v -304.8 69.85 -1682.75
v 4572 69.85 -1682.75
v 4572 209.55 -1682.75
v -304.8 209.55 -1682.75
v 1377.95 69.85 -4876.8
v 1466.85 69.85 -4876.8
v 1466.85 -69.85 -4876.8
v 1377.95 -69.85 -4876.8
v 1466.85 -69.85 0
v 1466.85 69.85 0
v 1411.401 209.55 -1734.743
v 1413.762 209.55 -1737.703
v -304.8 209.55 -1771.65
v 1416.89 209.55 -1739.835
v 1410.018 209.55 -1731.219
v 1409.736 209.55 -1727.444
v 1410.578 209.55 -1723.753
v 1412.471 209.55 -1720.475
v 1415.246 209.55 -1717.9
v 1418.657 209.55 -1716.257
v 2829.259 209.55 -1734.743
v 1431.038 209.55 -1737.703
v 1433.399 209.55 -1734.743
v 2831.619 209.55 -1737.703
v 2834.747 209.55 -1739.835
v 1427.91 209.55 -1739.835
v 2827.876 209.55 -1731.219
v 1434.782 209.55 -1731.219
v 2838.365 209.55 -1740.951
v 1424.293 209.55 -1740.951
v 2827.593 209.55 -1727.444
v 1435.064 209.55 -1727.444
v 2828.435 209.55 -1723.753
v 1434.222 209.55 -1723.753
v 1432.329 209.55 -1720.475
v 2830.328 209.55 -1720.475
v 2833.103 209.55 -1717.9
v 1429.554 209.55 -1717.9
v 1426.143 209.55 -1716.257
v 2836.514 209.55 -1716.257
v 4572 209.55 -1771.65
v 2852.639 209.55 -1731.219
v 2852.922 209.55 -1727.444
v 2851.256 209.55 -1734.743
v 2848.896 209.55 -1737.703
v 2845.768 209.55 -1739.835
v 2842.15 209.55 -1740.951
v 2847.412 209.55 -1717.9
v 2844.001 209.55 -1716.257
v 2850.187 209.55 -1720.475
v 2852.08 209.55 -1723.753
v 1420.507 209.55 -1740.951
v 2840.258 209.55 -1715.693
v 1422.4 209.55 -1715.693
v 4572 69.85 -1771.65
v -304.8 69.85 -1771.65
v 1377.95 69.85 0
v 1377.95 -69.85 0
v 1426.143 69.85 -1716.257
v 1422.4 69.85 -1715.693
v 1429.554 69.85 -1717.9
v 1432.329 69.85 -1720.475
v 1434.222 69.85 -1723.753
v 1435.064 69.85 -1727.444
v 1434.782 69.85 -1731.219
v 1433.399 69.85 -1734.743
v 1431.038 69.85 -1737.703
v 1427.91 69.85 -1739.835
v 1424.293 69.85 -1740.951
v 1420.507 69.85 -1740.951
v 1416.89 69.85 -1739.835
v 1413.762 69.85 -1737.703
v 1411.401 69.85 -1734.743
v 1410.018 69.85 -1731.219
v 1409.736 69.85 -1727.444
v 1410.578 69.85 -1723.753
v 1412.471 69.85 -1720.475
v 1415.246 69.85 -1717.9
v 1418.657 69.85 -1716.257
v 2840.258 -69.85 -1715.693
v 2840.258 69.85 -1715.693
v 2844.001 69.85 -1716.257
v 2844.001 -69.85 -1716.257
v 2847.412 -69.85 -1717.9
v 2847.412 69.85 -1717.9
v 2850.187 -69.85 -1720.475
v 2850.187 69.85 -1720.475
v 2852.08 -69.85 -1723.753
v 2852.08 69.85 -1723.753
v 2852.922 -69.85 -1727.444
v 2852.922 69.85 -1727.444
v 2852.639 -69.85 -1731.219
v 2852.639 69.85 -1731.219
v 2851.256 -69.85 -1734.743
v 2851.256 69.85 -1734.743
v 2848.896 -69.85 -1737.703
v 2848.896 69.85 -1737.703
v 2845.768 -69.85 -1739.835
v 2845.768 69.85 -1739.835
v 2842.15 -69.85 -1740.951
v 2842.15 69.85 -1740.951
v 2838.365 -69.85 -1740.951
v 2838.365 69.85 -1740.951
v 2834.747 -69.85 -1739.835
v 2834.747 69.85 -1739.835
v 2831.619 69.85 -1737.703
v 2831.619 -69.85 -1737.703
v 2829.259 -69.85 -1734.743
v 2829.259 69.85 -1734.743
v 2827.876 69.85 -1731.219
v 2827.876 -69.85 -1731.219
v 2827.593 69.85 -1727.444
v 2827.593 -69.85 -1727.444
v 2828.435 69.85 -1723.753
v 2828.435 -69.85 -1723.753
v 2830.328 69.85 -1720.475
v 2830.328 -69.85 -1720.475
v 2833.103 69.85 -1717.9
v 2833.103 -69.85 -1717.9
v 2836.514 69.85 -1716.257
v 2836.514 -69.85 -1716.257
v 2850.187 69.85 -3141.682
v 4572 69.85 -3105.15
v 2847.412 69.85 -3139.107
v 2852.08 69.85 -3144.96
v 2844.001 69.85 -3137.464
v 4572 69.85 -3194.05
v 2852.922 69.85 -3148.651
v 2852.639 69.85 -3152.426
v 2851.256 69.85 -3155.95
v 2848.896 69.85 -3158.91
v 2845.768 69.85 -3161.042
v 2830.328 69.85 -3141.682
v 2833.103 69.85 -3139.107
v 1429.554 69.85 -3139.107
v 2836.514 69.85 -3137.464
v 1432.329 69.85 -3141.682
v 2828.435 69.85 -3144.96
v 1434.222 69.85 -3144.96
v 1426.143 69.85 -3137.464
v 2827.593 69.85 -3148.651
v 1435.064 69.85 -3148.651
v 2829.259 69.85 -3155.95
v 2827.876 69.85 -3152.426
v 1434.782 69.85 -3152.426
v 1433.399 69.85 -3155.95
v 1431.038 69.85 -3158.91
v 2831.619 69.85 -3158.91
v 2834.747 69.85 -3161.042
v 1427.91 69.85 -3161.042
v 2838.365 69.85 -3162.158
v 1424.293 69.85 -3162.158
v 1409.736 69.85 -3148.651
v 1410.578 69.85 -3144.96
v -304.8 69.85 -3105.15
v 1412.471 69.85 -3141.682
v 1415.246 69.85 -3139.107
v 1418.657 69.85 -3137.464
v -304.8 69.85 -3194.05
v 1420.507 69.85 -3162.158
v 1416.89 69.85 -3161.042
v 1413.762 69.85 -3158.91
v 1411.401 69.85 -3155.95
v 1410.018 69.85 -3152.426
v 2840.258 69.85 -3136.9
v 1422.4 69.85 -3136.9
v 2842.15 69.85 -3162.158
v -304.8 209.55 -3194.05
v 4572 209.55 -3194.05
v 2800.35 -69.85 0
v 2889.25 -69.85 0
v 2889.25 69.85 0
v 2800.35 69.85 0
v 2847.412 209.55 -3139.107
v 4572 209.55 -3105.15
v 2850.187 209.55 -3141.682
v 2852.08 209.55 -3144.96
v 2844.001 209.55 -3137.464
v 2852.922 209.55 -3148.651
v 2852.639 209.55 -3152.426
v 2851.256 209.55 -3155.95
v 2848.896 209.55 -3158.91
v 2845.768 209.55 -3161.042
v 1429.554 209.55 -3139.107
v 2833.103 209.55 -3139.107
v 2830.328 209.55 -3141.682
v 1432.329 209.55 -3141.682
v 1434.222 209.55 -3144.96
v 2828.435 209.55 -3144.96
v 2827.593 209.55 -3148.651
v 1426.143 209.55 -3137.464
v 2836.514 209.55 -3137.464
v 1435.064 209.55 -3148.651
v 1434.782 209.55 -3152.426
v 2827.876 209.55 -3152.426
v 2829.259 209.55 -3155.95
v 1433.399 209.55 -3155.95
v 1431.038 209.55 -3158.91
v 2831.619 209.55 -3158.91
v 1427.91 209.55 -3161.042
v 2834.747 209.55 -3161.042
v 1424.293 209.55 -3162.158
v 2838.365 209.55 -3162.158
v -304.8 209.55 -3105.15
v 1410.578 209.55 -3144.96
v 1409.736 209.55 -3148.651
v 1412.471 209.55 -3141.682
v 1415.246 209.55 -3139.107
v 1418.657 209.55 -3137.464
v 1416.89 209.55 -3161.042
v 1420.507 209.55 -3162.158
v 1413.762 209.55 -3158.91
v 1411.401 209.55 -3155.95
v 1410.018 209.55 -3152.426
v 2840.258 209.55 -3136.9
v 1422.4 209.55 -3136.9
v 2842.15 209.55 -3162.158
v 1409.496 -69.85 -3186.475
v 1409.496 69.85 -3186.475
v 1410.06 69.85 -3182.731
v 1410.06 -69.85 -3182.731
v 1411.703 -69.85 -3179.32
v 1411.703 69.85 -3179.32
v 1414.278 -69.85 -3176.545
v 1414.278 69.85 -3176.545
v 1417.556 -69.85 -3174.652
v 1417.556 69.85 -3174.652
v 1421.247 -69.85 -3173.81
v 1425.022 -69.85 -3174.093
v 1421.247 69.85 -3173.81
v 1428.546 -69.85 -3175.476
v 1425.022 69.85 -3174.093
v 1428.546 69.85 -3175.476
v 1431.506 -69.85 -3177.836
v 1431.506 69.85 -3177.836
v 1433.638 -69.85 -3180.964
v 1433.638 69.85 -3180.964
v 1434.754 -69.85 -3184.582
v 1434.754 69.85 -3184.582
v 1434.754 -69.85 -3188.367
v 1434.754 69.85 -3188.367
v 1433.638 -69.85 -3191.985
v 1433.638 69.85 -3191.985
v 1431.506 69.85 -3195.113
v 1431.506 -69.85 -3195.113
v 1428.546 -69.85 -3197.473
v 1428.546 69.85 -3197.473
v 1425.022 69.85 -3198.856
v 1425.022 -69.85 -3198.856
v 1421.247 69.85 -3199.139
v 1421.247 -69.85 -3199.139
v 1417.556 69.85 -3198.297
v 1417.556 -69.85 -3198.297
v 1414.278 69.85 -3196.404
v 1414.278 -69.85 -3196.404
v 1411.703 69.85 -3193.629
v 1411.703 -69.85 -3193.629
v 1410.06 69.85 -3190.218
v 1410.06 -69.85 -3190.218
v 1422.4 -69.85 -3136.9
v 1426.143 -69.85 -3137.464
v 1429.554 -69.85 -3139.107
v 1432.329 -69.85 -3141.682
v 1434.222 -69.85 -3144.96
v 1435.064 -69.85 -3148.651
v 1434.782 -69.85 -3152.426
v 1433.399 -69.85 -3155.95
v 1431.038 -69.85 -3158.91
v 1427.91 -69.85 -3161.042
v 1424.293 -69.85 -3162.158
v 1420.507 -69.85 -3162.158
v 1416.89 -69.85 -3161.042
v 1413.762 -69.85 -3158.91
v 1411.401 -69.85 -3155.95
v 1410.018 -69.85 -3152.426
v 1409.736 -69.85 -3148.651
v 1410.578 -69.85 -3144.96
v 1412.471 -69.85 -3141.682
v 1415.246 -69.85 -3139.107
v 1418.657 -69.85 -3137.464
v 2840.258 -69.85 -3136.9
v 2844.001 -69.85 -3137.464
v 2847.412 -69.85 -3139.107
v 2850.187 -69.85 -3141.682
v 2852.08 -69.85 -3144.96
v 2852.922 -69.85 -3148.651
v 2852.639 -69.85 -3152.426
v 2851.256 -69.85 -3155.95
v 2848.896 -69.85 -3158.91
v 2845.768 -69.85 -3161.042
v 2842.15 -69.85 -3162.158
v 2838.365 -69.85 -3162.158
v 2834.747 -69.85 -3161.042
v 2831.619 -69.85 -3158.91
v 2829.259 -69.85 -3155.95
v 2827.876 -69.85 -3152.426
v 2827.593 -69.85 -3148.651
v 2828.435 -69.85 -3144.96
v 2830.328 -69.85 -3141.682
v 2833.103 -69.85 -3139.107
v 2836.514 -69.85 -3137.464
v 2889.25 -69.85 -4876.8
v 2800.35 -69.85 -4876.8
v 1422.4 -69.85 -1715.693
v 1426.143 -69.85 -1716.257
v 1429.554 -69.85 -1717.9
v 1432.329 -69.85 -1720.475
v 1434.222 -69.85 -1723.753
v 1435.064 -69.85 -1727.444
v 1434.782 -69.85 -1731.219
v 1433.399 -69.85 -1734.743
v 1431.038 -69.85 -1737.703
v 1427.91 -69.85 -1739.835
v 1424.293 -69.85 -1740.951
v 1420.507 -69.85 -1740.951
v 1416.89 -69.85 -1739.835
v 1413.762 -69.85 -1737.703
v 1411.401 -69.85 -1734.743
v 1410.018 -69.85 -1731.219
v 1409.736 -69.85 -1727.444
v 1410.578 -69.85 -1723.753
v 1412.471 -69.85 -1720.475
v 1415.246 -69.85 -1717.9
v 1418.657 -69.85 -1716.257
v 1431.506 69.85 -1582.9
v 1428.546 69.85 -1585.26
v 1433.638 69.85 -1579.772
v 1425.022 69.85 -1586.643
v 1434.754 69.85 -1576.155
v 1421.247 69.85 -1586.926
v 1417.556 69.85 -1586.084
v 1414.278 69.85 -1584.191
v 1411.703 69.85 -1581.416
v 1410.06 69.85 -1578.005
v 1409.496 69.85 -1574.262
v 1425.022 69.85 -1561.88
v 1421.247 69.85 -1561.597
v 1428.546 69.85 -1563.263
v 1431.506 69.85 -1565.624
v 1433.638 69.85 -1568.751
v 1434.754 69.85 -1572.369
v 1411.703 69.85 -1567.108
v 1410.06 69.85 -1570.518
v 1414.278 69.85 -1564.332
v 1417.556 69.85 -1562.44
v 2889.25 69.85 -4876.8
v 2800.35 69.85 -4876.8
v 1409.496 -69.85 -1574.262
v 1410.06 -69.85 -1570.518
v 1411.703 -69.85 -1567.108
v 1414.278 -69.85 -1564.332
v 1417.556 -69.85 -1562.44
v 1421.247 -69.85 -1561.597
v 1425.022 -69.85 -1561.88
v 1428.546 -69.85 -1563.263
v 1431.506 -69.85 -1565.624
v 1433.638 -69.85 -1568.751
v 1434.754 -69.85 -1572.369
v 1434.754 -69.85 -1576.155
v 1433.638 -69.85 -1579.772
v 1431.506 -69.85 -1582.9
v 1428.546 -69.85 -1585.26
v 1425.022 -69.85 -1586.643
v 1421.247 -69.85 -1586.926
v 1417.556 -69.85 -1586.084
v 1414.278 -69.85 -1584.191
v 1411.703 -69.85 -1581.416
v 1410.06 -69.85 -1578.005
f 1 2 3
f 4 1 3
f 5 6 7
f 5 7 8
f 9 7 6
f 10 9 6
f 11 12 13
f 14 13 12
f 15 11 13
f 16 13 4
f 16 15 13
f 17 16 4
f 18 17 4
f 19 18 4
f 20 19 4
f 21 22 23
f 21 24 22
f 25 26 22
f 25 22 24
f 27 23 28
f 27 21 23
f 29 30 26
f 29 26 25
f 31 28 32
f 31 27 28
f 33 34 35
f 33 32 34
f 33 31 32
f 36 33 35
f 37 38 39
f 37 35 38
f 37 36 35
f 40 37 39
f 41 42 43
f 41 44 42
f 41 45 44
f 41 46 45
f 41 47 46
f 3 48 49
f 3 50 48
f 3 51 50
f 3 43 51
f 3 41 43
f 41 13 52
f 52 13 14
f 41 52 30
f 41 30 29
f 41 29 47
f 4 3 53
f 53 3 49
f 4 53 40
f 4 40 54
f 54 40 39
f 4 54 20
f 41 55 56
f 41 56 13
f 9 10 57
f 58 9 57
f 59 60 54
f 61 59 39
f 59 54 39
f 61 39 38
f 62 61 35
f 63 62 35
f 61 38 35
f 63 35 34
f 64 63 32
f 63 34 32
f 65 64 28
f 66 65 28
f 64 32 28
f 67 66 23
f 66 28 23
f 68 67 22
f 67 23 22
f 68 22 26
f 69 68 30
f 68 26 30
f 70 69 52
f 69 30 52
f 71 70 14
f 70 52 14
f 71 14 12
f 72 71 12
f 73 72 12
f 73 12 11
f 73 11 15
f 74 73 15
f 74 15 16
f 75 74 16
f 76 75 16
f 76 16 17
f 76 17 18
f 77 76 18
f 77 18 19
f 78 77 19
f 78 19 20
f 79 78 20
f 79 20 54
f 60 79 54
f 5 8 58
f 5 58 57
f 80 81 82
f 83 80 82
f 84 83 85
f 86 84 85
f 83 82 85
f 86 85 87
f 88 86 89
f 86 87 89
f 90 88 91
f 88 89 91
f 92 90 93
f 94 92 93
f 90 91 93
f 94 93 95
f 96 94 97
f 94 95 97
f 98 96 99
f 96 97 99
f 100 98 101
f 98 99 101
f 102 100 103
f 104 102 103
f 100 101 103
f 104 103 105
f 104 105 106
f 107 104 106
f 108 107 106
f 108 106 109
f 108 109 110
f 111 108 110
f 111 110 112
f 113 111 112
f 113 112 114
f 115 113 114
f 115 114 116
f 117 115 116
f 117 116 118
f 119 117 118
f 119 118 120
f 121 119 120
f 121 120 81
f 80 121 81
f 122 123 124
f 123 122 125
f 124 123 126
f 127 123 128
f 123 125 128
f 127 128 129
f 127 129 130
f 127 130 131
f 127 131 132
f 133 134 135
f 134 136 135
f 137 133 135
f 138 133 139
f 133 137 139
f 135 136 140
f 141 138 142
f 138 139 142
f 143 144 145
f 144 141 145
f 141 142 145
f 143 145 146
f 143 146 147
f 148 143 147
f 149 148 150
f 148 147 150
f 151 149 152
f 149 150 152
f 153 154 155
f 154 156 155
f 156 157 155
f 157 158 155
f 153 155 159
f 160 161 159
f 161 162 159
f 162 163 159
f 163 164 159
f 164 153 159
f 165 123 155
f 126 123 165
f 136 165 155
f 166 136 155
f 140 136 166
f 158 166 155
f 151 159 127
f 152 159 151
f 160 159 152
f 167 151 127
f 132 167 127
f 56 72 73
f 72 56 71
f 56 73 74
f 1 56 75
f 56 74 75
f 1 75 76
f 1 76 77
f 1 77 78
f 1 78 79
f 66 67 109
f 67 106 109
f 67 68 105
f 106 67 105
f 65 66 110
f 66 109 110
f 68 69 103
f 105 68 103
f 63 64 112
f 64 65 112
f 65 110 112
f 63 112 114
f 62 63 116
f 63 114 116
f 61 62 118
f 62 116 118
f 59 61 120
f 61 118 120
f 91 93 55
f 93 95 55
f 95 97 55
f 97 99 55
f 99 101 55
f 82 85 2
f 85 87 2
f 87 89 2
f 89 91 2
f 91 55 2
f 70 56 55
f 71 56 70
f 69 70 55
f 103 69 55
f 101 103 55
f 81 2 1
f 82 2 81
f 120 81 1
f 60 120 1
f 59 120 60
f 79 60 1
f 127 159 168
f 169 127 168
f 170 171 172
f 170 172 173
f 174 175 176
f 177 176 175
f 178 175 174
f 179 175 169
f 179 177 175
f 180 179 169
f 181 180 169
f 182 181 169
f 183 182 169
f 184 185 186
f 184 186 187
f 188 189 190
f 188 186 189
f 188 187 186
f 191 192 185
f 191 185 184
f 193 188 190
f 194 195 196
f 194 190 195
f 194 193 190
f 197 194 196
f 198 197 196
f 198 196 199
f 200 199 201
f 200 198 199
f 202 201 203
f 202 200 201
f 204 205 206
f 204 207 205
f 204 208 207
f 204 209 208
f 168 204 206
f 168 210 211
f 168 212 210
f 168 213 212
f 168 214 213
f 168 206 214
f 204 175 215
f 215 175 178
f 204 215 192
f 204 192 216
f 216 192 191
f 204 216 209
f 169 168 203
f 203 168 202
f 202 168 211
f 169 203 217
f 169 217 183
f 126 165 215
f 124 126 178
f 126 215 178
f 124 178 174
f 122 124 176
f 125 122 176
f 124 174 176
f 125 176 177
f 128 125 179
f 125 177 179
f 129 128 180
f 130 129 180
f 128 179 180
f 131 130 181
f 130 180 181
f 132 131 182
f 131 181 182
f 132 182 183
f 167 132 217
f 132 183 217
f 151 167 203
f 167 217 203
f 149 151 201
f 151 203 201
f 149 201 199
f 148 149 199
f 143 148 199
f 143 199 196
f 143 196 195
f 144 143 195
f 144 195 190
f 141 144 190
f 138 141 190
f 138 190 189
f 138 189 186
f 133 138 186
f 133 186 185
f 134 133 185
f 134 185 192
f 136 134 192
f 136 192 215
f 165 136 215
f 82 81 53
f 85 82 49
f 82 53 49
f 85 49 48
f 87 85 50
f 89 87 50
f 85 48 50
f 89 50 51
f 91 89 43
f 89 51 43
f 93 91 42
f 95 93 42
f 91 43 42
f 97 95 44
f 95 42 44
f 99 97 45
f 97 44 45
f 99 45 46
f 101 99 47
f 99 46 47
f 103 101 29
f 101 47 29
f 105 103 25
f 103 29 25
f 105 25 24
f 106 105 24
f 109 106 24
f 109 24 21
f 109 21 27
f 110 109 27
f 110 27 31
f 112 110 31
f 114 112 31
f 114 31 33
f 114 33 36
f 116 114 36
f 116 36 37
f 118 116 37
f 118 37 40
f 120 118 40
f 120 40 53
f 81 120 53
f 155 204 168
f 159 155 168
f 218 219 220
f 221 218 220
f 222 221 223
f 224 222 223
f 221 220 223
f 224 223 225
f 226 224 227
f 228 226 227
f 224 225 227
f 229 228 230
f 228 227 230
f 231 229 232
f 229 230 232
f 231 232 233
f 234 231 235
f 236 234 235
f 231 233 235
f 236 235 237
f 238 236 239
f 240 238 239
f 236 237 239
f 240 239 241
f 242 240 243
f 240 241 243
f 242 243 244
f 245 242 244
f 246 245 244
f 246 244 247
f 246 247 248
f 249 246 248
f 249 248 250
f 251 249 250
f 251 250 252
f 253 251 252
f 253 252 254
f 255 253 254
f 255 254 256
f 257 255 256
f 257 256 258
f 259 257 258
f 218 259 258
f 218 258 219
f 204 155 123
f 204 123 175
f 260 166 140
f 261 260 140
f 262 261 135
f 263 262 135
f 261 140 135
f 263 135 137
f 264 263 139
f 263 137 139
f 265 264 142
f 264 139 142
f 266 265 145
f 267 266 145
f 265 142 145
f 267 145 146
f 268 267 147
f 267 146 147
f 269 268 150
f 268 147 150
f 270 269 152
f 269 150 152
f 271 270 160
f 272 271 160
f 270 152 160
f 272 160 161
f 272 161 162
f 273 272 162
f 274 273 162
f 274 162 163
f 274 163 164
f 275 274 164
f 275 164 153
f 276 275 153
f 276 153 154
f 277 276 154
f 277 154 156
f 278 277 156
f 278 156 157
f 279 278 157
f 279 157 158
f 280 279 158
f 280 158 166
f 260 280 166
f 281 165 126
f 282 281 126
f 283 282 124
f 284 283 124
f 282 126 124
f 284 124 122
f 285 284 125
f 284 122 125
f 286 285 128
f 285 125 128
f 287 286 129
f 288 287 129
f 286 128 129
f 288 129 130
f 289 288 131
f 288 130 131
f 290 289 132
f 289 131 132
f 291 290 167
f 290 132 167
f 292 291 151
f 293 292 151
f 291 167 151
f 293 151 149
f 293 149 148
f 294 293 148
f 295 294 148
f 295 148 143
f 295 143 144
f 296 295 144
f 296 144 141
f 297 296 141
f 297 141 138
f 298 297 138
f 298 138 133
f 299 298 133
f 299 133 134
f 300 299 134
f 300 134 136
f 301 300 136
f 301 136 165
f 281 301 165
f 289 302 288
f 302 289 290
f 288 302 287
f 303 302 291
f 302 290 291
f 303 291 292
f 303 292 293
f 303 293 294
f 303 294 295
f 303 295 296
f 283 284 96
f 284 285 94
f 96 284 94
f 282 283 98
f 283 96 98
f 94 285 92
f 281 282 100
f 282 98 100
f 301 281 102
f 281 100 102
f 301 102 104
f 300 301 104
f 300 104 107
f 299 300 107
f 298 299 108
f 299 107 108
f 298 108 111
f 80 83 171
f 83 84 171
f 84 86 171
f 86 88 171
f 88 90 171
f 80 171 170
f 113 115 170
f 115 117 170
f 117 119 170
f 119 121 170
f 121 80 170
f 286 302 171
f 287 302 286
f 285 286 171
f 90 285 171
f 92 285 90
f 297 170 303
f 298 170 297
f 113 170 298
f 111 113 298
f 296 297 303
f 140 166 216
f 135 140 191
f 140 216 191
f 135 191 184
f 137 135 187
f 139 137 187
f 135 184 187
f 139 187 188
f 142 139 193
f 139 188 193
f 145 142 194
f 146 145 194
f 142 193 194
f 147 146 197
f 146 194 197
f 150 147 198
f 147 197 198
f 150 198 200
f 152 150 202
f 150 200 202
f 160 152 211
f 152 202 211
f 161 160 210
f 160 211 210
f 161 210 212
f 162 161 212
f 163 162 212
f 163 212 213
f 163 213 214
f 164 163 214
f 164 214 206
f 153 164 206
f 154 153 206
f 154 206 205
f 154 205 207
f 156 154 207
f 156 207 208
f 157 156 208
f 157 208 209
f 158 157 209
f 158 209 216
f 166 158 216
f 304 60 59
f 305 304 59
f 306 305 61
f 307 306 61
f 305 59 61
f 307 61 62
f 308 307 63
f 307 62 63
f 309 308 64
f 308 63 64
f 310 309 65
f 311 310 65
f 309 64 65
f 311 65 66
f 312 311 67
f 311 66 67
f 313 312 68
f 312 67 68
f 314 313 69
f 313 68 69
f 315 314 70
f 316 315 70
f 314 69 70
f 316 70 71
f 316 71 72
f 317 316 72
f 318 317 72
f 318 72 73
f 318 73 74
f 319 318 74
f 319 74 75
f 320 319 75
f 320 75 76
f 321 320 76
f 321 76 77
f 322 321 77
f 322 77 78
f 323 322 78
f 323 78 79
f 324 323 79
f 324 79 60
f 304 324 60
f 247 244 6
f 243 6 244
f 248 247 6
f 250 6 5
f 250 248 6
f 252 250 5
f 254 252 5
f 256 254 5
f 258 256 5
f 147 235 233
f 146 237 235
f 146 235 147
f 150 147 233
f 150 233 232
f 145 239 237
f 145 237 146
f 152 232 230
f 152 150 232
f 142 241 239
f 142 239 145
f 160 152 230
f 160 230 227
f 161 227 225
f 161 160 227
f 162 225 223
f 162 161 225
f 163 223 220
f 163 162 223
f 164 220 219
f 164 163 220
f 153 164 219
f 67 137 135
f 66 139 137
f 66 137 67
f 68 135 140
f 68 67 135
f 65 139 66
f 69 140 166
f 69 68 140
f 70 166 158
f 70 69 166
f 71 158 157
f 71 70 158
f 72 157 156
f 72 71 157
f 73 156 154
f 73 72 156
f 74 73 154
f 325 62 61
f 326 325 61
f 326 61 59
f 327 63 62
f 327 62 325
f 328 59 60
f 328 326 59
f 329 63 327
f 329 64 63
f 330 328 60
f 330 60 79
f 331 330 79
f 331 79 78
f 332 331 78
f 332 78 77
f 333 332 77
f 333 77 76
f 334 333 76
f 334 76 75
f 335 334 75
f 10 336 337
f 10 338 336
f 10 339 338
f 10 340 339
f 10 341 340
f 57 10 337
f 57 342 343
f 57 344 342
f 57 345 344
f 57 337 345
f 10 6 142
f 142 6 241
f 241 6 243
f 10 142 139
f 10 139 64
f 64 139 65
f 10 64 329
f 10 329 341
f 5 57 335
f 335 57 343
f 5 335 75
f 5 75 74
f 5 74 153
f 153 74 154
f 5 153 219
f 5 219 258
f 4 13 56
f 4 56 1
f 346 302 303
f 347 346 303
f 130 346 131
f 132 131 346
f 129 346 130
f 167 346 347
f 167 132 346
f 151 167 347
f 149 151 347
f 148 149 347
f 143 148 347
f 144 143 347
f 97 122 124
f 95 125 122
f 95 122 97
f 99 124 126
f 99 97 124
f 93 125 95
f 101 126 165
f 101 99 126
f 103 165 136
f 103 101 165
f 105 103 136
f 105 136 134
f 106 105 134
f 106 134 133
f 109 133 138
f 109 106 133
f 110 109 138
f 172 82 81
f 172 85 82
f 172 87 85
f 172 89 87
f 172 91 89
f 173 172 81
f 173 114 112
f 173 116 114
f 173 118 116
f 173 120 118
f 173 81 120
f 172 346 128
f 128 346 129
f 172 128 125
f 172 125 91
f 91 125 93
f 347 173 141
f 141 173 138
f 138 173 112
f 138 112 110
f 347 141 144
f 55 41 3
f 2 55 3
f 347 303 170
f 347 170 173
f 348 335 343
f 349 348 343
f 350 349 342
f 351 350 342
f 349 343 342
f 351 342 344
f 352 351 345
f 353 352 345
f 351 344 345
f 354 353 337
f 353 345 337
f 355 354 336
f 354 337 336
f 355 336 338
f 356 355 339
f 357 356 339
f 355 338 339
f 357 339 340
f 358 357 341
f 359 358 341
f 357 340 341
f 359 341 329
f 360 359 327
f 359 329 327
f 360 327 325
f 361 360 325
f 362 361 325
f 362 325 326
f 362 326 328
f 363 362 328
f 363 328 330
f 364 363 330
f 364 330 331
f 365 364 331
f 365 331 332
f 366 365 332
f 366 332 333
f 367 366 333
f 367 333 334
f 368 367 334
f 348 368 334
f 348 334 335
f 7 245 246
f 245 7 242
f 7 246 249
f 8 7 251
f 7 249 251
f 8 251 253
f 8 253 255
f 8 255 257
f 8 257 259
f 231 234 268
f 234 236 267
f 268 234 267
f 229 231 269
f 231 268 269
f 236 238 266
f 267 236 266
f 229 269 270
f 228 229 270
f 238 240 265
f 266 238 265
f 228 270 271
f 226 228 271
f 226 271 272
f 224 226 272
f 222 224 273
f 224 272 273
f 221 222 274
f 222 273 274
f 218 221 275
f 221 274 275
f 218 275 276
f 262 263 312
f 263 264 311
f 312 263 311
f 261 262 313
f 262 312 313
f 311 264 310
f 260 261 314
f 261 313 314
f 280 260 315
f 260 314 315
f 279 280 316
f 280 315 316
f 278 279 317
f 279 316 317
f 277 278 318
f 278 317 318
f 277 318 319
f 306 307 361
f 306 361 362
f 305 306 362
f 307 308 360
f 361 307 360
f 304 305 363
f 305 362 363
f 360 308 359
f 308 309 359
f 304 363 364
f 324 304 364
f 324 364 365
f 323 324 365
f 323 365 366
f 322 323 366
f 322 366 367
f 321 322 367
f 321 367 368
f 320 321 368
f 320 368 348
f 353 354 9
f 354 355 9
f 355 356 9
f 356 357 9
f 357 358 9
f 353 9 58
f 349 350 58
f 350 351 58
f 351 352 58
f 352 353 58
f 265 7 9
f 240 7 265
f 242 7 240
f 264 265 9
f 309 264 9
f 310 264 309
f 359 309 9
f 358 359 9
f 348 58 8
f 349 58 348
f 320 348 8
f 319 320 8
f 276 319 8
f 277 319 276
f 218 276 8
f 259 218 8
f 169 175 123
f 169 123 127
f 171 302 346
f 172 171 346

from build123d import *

# Parameters (mm, degrees)
SKETCH1_W              = 88.9
SKETCH1_H              = 139.7
PROFILES_4X6_1_DEPTH   = 4876.8
SKETCH1_ON_SEGMENT_2_W = 88.9
SKETCH1_ON_SEGMENT_2_H = 139.7
PROFILES_4X6_1_2_DEPTH = 4876.8
SKETCH1_ON_SEGMENT_3_W = 88.9
SKETCH1_ON_SEGMENT_3_H = 139.7
PROFILES_4X6_1_3_DEPTH = 4876.8
SKETCH1_ON_SEGMENT_4_W = 88.9
SKETCH1_ON_SEGMENT_4_H = 139.7
PROFILES_4X6_1_4_DEPTH = 4876.8
SKETCH13_R             = 12.7
CUT_EXTRUDE1_DEPTH     = 6691.622287949
SKETCH15_R             = 12.7
CUT_EXTRUDE5_DEPTH     = 6687.245458402


with BuildPart() as part:
    # Sketch1 → Profiles 4X6(1) (new body)
    with BuildSketch(Plane(origin=(1422.4, 0, 0), x_dir=(-1, 0, 0), z_dir=(0, 0, -1))):
        Rectangle(SKETCH1_W, SKETCH1_H)
    extrude(amount=PROFILES_4X6_1_DEPTH)


with BuildPart() as body_2:
    # Sketch1 on segment 2 (carried to segment 2) → Profiles 4X6_1 2 (new body)
    with BuildSketch(Plane(origin=(2844.8, 0, 0), x_dir=(-1, 0, 0), z_dir=(0, 0, -1))):
        Rectangle(SKETCH1_ON_SEGMENT_2_W, SKETCH1_ON_SEGMENT_2_H)
    extrude(amount=PROFILES_4X6_1_2_DEPTH)


with BuildPart() as body_3:
    # Sketch1 on segment 3 (carried to segment 3) → Profiles 4X6_1 3 (new body)
    with BuildSketch(Plane(origin=(-304.8, 139.7, -3149.6), x_dir=(0, 0, -1), z_dir=(1, 0, 0))):
        Rectangle(SKETCH1_ON_SEGMENT_3_W, SKETCH1_ON_SEGMENT_3_H)
    extrude(amount=PROFILES_4X6_1_3_DEPTH)


with BuildPart() as body_4:
    # Sketch1 on segment 4 (carried to segment 4) → Profiles 4X6_1 4 (new body)
    with BuildSketch(Plane(origin=(4572, 139.7, -1727.2), x_dir=(0, 0, 1), z_dir=(-1, 0, 0))):
        Rectangle(SKETCH1_ON_SEGMENT_4_W, SKETCH1_ON_SEGMENT_4_H)
    extrude(amount=PROFILES_4X6_1_4_DEPTH)


with BuildPart() as cut_extrude1_tool:
    # Sketch13 → Cut-Extrude1 (new, through all)
    with BuildSketch(Plane(origin=(0, 209.55, 0), x_dir=(1, 0, 0), z_dir=(0, 1, 0))):
        with Locations(Location((1422.4, 3149.6, 0), (0, 0, 270))):
            Circle(SKETCH13_R)
        with Locations(Location((2840.257577537, 3149.6, 0), (0, 0, 270))):
            Circle(SKETCH13_R)
        with Locations(Location((1422.4, 1728.393041163, 0), (0, 0, 270))):
            Circle(SKETCH13_R)
        with Locations(Location((2840.257577537, 1728.393041163, 0), (0, 0, 270))):
            Circle(SKETCH13_R)
    extrude(amount=-CUT_EXTRUDE1_DEPTH)


with BuildPart() as part_1:
    add(part.part)

    # Cut-Extrude1: cut by cut_extrude1_tool
    add(cut_extrude1_tool.part, mode=Mode.SUBTRACT)

    # Sketch15 → Cut-Extrude5 (cut, through all)
    with BuildSketch(Plane(origin=(0, 69.85, 0), x_dir=(1, 0, 0), z_dir=(0, 1, 0))):
        with Locations(Location((1422.19609917, 1574.261712408, 0), (0, 0, 180))):
            Circle(SKETCH15_R)
        with Locations(Location((1422.19609917, 3186.474586948, 0), (0, 0, 180))):
            Circle(SKETCH15_R)
    extrude(amount=-CUT_EXTRUDE5_DEPTH, mode=Mode.SUBTRACT)


with BuildPart() as body_2_1:
    add(body_2.part)

    # Cut-Extrude1: cut by cut_extrude1_tool
    add(cut_extrude1_tool.part, mode=Mode.SUBTRACT)


with BuildPart() as body_3_1:
    add(body_3.part)

    # Cut-Extrude1: cut by cut_extrude1_tool
    add(cut_extrude1_tool.part, mode=Mode.SUBTRACT)


with BuildPart() as body_4_1:
    add(body_4.part)

    # Cut-Extrude1: cut by cut_extrude1_tool
    add(cut_extrude1_tool.part, mode=Mode.SUBTRACT)


solid = Compound([part_1.part, body_2_1.part, body_3_1.part, body_4_1.part])
